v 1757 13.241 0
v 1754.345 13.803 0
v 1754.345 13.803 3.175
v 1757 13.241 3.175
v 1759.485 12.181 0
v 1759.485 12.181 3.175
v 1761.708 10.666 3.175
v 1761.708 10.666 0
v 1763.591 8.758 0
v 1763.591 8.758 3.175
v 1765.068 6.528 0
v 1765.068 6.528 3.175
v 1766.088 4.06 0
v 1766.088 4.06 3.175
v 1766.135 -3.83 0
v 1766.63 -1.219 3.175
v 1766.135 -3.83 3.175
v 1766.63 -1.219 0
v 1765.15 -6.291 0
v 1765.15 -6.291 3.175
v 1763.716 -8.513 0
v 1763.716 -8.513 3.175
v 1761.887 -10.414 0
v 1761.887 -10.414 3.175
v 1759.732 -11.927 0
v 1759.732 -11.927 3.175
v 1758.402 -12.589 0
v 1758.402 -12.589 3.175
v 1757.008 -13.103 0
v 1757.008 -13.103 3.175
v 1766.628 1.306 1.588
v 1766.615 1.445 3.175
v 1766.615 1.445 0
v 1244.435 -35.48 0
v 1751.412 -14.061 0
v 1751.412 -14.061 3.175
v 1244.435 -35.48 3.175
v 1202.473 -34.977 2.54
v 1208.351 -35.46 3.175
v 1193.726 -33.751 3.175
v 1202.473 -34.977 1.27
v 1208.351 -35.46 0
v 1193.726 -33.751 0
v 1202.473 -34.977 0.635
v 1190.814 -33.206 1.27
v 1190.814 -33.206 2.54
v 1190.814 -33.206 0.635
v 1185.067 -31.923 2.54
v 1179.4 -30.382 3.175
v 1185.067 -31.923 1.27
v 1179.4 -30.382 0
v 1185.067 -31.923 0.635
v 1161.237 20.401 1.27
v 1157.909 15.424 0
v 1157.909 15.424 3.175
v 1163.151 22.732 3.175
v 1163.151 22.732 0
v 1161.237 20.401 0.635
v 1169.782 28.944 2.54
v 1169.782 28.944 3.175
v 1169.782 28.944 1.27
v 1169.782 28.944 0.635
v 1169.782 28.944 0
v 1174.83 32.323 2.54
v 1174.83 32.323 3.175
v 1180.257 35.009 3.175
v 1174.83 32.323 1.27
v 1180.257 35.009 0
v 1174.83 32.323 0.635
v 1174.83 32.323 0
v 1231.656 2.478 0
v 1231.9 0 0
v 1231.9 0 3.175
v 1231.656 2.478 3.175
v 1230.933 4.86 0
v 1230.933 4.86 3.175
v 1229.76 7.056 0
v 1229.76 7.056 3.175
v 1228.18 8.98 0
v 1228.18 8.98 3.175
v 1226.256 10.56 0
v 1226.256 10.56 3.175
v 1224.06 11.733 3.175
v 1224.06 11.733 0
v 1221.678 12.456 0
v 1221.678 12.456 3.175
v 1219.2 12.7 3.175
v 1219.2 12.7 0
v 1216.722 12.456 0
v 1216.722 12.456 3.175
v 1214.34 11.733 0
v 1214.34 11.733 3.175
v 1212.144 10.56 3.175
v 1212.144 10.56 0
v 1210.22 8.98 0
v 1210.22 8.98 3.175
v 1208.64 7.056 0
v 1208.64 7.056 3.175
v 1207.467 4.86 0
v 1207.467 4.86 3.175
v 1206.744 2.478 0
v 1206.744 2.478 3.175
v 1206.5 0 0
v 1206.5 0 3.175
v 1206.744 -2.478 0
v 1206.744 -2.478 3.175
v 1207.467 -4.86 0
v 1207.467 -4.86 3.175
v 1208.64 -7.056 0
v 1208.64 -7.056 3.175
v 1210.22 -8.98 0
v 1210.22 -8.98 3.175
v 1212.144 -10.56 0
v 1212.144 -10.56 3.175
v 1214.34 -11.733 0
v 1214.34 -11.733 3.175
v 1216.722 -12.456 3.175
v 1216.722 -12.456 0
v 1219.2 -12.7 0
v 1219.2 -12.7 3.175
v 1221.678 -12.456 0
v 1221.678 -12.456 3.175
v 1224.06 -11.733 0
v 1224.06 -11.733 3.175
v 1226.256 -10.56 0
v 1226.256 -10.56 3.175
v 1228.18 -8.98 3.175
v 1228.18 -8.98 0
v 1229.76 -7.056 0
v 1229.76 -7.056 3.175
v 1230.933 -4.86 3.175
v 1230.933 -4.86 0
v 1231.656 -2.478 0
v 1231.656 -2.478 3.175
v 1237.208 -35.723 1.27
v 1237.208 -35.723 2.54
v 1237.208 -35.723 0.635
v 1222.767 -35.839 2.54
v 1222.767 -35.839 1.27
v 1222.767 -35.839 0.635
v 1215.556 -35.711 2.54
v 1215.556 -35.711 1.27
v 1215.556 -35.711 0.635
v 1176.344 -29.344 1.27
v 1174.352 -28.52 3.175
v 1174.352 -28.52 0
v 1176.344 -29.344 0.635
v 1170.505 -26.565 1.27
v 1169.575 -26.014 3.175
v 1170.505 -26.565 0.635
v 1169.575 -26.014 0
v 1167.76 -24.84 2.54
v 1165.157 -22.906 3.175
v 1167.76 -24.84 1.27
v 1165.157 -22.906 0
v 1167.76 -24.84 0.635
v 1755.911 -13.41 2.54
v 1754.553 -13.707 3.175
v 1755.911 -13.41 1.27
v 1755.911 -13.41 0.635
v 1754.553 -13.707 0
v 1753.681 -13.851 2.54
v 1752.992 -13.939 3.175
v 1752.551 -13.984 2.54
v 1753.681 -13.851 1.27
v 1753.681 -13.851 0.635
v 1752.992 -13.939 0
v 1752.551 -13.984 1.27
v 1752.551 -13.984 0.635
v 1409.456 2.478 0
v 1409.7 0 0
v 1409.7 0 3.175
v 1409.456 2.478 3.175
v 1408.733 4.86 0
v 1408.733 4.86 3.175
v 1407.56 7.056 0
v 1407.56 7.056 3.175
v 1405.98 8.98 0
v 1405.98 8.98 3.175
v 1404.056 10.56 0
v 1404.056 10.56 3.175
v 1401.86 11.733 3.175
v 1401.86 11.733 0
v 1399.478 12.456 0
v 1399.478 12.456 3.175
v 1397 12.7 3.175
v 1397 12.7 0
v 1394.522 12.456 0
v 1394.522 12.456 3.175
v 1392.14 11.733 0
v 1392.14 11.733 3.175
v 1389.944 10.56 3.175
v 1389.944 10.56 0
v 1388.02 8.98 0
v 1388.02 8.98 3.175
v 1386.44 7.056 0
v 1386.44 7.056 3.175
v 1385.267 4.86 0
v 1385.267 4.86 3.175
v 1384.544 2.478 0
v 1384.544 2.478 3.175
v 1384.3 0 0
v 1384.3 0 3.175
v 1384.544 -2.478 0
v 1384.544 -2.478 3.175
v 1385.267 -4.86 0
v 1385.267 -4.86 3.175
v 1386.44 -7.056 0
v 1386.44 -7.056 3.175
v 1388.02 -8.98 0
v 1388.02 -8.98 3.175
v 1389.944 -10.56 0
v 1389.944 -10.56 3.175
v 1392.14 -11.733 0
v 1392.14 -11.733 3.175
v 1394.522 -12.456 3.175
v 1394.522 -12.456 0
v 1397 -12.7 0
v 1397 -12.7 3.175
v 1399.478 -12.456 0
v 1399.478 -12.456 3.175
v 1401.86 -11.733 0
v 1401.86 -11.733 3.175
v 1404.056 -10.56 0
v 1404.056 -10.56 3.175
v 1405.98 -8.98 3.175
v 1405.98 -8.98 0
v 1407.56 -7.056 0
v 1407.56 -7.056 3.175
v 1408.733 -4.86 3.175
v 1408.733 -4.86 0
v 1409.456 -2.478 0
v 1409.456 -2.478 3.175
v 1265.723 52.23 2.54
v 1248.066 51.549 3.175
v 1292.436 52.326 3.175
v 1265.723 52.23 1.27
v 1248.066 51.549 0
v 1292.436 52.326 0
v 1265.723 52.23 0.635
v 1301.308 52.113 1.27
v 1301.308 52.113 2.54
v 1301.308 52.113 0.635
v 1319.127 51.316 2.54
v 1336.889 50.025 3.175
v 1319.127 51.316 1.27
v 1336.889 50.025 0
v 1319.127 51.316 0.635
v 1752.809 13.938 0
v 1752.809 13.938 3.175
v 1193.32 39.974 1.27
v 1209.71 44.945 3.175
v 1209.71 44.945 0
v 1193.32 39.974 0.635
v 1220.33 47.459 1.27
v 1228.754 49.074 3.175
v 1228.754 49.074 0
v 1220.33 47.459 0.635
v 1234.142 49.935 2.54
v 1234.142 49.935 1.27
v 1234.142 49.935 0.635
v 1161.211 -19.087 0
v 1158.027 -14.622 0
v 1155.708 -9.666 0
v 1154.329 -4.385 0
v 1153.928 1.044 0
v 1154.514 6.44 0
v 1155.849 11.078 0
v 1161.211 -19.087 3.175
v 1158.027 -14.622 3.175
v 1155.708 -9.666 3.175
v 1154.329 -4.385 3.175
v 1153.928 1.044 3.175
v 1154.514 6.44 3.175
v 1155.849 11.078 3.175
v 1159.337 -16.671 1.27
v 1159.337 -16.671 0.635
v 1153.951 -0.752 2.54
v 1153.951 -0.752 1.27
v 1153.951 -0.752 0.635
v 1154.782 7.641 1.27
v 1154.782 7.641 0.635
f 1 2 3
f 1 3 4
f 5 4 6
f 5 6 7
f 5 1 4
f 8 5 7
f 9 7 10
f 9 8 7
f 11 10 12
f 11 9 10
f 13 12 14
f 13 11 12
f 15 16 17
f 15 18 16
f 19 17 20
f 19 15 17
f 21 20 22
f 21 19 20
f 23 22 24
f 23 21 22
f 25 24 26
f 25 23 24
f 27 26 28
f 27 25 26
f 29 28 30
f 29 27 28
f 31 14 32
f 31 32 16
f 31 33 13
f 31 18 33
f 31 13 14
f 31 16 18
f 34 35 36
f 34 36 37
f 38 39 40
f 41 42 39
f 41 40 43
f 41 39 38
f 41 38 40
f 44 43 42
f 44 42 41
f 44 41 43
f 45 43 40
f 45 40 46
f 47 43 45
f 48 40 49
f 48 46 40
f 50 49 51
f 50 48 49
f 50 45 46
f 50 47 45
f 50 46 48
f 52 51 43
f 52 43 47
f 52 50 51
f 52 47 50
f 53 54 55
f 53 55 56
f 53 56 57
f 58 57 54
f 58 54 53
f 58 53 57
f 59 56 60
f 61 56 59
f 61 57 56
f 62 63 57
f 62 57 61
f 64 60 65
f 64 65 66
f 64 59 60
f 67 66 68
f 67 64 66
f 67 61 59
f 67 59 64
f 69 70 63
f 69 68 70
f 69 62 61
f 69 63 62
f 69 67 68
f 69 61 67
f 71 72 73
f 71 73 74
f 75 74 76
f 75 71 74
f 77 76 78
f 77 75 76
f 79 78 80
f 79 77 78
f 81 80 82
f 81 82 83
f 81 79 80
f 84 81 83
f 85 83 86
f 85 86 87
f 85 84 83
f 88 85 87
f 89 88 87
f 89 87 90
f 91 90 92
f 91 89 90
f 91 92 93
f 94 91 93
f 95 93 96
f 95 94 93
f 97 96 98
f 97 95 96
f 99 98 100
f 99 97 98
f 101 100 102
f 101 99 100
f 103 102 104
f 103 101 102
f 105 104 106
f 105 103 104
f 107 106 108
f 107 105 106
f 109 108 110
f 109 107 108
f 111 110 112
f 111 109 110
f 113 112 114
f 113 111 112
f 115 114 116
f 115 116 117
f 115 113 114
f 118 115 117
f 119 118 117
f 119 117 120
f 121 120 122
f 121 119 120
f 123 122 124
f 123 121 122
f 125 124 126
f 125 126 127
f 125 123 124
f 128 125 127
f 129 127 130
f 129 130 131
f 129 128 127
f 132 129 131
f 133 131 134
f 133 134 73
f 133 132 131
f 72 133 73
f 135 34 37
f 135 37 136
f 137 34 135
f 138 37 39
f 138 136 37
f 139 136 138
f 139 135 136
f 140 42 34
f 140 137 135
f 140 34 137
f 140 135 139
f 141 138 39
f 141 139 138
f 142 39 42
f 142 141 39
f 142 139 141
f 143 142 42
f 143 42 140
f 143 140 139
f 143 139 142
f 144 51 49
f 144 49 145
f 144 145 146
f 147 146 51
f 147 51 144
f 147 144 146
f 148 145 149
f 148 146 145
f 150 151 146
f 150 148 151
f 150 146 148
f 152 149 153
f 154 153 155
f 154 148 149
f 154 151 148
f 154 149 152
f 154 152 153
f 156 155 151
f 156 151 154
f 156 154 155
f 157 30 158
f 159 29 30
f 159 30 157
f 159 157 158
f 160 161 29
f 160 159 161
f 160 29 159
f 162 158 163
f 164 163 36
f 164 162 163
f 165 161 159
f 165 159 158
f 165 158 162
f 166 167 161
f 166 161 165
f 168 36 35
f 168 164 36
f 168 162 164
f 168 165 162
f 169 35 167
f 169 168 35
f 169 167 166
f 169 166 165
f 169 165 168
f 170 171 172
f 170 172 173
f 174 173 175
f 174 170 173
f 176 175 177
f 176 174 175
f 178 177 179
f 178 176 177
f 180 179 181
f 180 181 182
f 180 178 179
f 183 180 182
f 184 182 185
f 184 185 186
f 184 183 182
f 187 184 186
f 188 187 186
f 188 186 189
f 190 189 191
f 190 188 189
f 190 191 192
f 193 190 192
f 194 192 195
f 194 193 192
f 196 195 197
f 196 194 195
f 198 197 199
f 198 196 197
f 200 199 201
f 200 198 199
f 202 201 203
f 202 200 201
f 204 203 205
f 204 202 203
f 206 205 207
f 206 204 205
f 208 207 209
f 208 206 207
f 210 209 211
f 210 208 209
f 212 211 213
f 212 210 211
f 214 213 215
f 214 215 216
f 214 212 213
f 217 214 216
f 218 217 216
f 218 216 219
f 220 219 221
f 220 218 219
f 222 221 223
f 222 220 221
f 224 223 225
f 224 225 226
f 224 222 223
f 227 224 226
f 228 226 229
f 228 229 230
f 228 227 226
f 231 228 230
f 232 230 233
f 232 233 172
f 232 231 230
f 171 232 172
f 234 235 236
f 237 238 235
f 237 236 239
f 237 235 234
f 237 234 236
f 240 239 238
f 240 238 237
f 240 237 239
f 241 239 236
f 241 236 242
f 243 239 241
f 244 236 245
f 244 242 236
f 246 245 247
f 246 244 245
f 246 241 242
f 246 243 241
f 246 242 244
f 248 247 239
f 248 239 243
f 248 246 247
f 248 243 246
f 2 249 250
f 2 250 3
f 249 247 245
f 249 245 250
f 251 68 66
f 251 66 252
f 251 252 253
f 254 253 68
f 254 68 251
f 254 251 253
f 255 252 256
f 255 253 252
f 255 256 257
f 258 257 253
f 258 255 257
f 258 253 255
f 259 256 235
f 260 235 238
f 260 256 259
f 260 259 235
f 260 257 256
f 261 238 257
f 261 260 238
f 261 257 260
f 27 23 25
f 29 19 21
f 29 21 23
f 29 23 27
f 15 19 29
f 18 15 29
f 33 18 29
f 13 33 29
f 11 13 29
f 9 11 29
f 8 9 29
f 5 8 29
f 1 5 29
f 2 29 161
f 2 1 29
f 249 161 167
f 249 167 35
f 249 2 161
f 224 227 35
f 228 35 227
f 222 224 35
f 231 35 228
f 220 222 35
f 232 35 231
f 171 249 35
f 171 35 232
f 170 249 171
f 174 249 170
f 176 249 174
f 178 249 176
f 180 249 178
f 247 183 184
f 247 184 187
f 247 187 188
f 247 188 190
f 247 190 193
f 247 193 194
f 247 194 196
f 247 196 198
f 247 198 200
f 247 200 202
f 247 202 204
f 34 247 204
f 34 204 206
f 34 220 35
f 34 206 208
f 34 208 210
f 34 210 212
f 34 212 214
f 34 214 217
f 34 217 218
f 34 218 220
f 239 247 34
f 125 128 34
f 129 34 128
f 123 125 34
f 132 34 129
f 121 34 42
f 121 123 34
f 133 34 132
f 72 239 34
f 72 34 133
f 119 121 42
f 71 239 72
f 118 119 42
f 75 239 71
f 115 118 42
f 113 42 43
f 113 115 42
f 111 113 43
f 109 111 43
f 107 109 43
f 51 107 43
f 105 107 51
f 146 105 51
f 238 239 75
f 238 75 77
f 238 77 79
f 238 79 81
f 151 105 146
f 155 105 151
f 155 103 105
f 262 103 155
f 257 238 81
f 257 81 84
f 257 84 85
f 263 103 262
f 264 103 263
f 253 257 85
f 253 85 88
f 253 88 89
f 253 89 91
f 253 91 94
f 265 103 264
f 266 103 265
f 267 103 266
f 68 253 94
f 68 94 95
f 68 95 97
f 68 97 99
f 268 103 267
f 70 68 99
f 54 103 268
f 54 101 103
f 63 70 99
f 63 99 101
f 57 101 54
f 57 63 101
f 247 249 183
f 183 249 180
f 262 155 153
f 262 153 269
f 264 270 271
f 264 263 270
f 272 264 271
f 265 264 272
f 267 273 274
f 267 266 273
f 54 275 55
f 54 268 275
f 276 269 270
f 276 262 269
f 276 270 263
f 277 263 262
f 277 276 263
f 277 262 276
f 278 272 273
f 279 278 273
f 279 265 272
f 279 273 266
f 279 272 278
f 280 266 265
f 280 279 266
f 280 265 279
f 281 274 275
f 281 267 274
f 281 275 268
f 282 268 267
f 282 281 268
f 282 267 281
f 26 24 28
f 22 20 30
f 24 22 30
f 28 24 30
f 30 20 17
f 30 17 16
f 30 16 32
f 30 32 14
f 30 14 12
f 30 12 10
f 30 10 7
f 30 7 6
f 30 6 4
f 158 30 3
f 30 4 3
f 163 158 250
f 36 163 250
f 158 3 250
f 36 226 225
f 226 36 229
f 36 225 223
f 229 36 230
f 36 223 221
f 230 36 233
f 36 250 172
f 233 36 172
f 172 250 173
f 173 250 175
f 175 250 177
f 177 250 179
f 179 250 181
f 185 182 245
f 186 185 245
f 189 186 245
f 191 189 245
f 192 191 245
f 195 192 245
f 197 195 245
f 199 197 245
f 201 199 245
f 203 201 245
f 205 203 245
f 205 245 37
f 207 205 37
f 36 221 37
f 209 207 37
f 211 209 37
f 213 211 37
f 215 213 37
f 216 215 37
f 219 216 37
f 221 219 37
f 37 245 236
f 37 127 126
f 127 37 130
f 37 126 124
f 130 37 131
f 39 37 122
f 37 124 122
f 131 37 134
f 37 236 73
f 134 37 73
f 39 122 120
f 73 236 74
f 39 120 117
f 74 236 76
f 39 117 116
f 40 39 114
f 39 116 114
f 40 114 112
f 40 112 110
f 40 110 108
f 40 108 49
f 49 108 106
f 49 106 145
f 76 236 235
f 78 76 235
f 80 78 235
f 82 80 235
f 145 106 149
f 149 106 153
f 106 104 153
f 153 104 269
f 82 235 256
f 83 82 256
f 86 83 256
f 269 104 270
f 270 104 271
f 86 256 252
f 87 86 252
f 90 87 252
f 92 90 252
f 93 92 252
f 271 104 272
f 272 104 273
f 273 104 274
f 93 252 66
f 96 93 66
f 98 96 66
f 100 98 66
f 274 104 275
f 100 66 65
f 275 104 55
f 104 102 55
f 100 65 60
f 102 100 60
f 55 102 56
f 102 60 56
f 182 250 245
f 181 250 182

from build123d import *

# Parameters (mm, degrees)
SKETCH1_R           = 12.7
BOSS_EXTRUDE1_DEPTH = 3.175


with BuildPart() as part:
    # Sketch1 → Boss-Extrude1 (new body)
    with BuildSketch(Plane.XY):
        with BuildLine():
            add(Edge.make_bspline(
                [(1180.257267692, 35.008813197), (1193.139660075, 40.367726318), (1206.502168928, 44.757651465), (1220.202331731, 48.102785241), (1234.110916593, 50.369156642), (1248.066405738, 51.549120089)],
                knots=[0, 0, 0, 0, 0, 0, 1, 1, 1, 1, 1, 1], degree=5, weights=[1, 1, 1, 1, 1, 1]))
            add(Edge.make_bspline(
                [(1248.066405738, 51.549120089), (1265.679828886, 52.474823917), (1283.368004198, 52.789080637), (1301.370484818, 52.480125285), (1319.15681764, 51.563533118), (1336.889341522, 50.02497466)],
                knots=[0, 0, 0, 0, 0, 0, 1, 1, 1, 1, 1, 1], degree=5, weights=[1, 1, 1, 1, 1, 1]))
            Line((1336.889341522, 50.02497466), (1752.808980038, 13.93780041))
            Line((1752.808980038, 13.93780041), (1754.345072535, 13.803055131))
            add(Edge.make_bspline(
                [(1754.345072535, 13.803055131), (1758.163986963, 13.377520973), (1761.808331334, 11.637779034), (1764.656991405, 8.697593334), (1767.912340295, 1.401754935), (1766.036876744, -6.330059827), (1763.761554618, -9.699687787), (1760.566866313, -12.006562455), (1757.008478216, -13.102648357)],
                knots=[0, 0, 0, 0, 0, 0, 0.499136526, 0.499136526, 0.499136526, 1, 1, 1, 1, 1, 1], degree=5, weights=[1, 1, 1, 1, 1, 1, 1, 1, 1]))
            add(Edge.make_bspline(
                [(1757.008478216, -13.102648357), (1755.921130701, -13.437582626), (1754.801749829, -13.705134636), (1753.693337404, -13.893612086), (1752.554243561, -14.012542135), (1751.412280363, -14.061025297)],
                knots=[0, 0, 0, 0, 0, 0, 1, 1, 1, 1, 1, 1], degree=5, weights=[1, 1, 1, 1, 1, 1]))
            Line((1751.412280363, -14.061025297), (1244.434737181, -35.48015746))
            add(Edge.make_bspline(
                [(1244.434737181, -35.48015746), (1237.20914689, -35.785429122), (1229.977046286, -35.935307578), (1222.765615669, -35.931234225), (1215.551331729, -35.772585361), (1208.350739251, -35.45985118)],
                knots=[2.45e-07, 2.45e-07, 2.45e-07, 2.45e-07, 2.45e-07, 2.45e-07, 1, 1, 1, 1, 1, 1], degree=5, weights=[1, 1, 1, 1, 1, 1]))
            add(Edge.make_bspline(
                [(1208.350739251, -35.45985118), (1202.466477316, -35.112672095), (1196.591377285, -34.427059535), (1190.765084976, -33.40383537), (1185.022373471, -32.050408368), (1179.399562393, -30.382176523)],
                knots=[0, 0, 0, 0, 0, 0, 1, 1, 1, 1, 1, 1], degree=5, weights=[1, 1, 1, 1, 1, 1]))
            add(Edge.make_bspline(
                [(1179.399562393, -30.382176523), (1176.308617194, -29.465123967), (1173.297136008, -28.243926124), (1170.408947138, -26.729193922), (1167.683819714, -24.940258655), (1165.157103336, -22.905582819)],
                knots=[0, 0, 0, 0, 0, 0, 1, 1, 1, 1, 1, 1], degree=5, weights=[1, 1, 1, 1, 1, 1]))
            add(Edge.make_bspline(
                [(1165.157103336, -22.905582819), (1158.48797036, -17.53516411), (1153.722824671, -9.797202261), (1152.048165632, -0.661270673), (1153.715186732, 8.163030967), (1157.908663687, 15.423698563)],
                knots=[0, 0, 0, 0, 0, 0, 1, 1, 1, 1, 1, 1], degree=5, weights=[1, 1, 1, 1, 1, 1]))
            add(Edge.make_bspline(
                [(1157.908663687, 15.423698563), (1160.887782958, 20.581804011), (1164.761606365, 25.336166686), (1169.428635805, 29.436314437), (1174.678948991, 32.688303087), (1180.257267692, 35.008813197)],
                knots=[0, 0, 0, 0, 0, 0, 1, 1, 1, 1, 1, 1], degree=5, weights=[1, 1, 1, 1, 1, 1]))
        make_face()
        with Locations((1397, 0)):
            Circle(SKETCH1_R, mode=Mode.SUBTRACT)
        with Locations((1219.2, 0)):
            Circle(SKETCH1_R, mode=Mode.SUBTRACT)
    extrude(amount=BOSS_EXTRUDE1_DEPTH)


solid = part.part
